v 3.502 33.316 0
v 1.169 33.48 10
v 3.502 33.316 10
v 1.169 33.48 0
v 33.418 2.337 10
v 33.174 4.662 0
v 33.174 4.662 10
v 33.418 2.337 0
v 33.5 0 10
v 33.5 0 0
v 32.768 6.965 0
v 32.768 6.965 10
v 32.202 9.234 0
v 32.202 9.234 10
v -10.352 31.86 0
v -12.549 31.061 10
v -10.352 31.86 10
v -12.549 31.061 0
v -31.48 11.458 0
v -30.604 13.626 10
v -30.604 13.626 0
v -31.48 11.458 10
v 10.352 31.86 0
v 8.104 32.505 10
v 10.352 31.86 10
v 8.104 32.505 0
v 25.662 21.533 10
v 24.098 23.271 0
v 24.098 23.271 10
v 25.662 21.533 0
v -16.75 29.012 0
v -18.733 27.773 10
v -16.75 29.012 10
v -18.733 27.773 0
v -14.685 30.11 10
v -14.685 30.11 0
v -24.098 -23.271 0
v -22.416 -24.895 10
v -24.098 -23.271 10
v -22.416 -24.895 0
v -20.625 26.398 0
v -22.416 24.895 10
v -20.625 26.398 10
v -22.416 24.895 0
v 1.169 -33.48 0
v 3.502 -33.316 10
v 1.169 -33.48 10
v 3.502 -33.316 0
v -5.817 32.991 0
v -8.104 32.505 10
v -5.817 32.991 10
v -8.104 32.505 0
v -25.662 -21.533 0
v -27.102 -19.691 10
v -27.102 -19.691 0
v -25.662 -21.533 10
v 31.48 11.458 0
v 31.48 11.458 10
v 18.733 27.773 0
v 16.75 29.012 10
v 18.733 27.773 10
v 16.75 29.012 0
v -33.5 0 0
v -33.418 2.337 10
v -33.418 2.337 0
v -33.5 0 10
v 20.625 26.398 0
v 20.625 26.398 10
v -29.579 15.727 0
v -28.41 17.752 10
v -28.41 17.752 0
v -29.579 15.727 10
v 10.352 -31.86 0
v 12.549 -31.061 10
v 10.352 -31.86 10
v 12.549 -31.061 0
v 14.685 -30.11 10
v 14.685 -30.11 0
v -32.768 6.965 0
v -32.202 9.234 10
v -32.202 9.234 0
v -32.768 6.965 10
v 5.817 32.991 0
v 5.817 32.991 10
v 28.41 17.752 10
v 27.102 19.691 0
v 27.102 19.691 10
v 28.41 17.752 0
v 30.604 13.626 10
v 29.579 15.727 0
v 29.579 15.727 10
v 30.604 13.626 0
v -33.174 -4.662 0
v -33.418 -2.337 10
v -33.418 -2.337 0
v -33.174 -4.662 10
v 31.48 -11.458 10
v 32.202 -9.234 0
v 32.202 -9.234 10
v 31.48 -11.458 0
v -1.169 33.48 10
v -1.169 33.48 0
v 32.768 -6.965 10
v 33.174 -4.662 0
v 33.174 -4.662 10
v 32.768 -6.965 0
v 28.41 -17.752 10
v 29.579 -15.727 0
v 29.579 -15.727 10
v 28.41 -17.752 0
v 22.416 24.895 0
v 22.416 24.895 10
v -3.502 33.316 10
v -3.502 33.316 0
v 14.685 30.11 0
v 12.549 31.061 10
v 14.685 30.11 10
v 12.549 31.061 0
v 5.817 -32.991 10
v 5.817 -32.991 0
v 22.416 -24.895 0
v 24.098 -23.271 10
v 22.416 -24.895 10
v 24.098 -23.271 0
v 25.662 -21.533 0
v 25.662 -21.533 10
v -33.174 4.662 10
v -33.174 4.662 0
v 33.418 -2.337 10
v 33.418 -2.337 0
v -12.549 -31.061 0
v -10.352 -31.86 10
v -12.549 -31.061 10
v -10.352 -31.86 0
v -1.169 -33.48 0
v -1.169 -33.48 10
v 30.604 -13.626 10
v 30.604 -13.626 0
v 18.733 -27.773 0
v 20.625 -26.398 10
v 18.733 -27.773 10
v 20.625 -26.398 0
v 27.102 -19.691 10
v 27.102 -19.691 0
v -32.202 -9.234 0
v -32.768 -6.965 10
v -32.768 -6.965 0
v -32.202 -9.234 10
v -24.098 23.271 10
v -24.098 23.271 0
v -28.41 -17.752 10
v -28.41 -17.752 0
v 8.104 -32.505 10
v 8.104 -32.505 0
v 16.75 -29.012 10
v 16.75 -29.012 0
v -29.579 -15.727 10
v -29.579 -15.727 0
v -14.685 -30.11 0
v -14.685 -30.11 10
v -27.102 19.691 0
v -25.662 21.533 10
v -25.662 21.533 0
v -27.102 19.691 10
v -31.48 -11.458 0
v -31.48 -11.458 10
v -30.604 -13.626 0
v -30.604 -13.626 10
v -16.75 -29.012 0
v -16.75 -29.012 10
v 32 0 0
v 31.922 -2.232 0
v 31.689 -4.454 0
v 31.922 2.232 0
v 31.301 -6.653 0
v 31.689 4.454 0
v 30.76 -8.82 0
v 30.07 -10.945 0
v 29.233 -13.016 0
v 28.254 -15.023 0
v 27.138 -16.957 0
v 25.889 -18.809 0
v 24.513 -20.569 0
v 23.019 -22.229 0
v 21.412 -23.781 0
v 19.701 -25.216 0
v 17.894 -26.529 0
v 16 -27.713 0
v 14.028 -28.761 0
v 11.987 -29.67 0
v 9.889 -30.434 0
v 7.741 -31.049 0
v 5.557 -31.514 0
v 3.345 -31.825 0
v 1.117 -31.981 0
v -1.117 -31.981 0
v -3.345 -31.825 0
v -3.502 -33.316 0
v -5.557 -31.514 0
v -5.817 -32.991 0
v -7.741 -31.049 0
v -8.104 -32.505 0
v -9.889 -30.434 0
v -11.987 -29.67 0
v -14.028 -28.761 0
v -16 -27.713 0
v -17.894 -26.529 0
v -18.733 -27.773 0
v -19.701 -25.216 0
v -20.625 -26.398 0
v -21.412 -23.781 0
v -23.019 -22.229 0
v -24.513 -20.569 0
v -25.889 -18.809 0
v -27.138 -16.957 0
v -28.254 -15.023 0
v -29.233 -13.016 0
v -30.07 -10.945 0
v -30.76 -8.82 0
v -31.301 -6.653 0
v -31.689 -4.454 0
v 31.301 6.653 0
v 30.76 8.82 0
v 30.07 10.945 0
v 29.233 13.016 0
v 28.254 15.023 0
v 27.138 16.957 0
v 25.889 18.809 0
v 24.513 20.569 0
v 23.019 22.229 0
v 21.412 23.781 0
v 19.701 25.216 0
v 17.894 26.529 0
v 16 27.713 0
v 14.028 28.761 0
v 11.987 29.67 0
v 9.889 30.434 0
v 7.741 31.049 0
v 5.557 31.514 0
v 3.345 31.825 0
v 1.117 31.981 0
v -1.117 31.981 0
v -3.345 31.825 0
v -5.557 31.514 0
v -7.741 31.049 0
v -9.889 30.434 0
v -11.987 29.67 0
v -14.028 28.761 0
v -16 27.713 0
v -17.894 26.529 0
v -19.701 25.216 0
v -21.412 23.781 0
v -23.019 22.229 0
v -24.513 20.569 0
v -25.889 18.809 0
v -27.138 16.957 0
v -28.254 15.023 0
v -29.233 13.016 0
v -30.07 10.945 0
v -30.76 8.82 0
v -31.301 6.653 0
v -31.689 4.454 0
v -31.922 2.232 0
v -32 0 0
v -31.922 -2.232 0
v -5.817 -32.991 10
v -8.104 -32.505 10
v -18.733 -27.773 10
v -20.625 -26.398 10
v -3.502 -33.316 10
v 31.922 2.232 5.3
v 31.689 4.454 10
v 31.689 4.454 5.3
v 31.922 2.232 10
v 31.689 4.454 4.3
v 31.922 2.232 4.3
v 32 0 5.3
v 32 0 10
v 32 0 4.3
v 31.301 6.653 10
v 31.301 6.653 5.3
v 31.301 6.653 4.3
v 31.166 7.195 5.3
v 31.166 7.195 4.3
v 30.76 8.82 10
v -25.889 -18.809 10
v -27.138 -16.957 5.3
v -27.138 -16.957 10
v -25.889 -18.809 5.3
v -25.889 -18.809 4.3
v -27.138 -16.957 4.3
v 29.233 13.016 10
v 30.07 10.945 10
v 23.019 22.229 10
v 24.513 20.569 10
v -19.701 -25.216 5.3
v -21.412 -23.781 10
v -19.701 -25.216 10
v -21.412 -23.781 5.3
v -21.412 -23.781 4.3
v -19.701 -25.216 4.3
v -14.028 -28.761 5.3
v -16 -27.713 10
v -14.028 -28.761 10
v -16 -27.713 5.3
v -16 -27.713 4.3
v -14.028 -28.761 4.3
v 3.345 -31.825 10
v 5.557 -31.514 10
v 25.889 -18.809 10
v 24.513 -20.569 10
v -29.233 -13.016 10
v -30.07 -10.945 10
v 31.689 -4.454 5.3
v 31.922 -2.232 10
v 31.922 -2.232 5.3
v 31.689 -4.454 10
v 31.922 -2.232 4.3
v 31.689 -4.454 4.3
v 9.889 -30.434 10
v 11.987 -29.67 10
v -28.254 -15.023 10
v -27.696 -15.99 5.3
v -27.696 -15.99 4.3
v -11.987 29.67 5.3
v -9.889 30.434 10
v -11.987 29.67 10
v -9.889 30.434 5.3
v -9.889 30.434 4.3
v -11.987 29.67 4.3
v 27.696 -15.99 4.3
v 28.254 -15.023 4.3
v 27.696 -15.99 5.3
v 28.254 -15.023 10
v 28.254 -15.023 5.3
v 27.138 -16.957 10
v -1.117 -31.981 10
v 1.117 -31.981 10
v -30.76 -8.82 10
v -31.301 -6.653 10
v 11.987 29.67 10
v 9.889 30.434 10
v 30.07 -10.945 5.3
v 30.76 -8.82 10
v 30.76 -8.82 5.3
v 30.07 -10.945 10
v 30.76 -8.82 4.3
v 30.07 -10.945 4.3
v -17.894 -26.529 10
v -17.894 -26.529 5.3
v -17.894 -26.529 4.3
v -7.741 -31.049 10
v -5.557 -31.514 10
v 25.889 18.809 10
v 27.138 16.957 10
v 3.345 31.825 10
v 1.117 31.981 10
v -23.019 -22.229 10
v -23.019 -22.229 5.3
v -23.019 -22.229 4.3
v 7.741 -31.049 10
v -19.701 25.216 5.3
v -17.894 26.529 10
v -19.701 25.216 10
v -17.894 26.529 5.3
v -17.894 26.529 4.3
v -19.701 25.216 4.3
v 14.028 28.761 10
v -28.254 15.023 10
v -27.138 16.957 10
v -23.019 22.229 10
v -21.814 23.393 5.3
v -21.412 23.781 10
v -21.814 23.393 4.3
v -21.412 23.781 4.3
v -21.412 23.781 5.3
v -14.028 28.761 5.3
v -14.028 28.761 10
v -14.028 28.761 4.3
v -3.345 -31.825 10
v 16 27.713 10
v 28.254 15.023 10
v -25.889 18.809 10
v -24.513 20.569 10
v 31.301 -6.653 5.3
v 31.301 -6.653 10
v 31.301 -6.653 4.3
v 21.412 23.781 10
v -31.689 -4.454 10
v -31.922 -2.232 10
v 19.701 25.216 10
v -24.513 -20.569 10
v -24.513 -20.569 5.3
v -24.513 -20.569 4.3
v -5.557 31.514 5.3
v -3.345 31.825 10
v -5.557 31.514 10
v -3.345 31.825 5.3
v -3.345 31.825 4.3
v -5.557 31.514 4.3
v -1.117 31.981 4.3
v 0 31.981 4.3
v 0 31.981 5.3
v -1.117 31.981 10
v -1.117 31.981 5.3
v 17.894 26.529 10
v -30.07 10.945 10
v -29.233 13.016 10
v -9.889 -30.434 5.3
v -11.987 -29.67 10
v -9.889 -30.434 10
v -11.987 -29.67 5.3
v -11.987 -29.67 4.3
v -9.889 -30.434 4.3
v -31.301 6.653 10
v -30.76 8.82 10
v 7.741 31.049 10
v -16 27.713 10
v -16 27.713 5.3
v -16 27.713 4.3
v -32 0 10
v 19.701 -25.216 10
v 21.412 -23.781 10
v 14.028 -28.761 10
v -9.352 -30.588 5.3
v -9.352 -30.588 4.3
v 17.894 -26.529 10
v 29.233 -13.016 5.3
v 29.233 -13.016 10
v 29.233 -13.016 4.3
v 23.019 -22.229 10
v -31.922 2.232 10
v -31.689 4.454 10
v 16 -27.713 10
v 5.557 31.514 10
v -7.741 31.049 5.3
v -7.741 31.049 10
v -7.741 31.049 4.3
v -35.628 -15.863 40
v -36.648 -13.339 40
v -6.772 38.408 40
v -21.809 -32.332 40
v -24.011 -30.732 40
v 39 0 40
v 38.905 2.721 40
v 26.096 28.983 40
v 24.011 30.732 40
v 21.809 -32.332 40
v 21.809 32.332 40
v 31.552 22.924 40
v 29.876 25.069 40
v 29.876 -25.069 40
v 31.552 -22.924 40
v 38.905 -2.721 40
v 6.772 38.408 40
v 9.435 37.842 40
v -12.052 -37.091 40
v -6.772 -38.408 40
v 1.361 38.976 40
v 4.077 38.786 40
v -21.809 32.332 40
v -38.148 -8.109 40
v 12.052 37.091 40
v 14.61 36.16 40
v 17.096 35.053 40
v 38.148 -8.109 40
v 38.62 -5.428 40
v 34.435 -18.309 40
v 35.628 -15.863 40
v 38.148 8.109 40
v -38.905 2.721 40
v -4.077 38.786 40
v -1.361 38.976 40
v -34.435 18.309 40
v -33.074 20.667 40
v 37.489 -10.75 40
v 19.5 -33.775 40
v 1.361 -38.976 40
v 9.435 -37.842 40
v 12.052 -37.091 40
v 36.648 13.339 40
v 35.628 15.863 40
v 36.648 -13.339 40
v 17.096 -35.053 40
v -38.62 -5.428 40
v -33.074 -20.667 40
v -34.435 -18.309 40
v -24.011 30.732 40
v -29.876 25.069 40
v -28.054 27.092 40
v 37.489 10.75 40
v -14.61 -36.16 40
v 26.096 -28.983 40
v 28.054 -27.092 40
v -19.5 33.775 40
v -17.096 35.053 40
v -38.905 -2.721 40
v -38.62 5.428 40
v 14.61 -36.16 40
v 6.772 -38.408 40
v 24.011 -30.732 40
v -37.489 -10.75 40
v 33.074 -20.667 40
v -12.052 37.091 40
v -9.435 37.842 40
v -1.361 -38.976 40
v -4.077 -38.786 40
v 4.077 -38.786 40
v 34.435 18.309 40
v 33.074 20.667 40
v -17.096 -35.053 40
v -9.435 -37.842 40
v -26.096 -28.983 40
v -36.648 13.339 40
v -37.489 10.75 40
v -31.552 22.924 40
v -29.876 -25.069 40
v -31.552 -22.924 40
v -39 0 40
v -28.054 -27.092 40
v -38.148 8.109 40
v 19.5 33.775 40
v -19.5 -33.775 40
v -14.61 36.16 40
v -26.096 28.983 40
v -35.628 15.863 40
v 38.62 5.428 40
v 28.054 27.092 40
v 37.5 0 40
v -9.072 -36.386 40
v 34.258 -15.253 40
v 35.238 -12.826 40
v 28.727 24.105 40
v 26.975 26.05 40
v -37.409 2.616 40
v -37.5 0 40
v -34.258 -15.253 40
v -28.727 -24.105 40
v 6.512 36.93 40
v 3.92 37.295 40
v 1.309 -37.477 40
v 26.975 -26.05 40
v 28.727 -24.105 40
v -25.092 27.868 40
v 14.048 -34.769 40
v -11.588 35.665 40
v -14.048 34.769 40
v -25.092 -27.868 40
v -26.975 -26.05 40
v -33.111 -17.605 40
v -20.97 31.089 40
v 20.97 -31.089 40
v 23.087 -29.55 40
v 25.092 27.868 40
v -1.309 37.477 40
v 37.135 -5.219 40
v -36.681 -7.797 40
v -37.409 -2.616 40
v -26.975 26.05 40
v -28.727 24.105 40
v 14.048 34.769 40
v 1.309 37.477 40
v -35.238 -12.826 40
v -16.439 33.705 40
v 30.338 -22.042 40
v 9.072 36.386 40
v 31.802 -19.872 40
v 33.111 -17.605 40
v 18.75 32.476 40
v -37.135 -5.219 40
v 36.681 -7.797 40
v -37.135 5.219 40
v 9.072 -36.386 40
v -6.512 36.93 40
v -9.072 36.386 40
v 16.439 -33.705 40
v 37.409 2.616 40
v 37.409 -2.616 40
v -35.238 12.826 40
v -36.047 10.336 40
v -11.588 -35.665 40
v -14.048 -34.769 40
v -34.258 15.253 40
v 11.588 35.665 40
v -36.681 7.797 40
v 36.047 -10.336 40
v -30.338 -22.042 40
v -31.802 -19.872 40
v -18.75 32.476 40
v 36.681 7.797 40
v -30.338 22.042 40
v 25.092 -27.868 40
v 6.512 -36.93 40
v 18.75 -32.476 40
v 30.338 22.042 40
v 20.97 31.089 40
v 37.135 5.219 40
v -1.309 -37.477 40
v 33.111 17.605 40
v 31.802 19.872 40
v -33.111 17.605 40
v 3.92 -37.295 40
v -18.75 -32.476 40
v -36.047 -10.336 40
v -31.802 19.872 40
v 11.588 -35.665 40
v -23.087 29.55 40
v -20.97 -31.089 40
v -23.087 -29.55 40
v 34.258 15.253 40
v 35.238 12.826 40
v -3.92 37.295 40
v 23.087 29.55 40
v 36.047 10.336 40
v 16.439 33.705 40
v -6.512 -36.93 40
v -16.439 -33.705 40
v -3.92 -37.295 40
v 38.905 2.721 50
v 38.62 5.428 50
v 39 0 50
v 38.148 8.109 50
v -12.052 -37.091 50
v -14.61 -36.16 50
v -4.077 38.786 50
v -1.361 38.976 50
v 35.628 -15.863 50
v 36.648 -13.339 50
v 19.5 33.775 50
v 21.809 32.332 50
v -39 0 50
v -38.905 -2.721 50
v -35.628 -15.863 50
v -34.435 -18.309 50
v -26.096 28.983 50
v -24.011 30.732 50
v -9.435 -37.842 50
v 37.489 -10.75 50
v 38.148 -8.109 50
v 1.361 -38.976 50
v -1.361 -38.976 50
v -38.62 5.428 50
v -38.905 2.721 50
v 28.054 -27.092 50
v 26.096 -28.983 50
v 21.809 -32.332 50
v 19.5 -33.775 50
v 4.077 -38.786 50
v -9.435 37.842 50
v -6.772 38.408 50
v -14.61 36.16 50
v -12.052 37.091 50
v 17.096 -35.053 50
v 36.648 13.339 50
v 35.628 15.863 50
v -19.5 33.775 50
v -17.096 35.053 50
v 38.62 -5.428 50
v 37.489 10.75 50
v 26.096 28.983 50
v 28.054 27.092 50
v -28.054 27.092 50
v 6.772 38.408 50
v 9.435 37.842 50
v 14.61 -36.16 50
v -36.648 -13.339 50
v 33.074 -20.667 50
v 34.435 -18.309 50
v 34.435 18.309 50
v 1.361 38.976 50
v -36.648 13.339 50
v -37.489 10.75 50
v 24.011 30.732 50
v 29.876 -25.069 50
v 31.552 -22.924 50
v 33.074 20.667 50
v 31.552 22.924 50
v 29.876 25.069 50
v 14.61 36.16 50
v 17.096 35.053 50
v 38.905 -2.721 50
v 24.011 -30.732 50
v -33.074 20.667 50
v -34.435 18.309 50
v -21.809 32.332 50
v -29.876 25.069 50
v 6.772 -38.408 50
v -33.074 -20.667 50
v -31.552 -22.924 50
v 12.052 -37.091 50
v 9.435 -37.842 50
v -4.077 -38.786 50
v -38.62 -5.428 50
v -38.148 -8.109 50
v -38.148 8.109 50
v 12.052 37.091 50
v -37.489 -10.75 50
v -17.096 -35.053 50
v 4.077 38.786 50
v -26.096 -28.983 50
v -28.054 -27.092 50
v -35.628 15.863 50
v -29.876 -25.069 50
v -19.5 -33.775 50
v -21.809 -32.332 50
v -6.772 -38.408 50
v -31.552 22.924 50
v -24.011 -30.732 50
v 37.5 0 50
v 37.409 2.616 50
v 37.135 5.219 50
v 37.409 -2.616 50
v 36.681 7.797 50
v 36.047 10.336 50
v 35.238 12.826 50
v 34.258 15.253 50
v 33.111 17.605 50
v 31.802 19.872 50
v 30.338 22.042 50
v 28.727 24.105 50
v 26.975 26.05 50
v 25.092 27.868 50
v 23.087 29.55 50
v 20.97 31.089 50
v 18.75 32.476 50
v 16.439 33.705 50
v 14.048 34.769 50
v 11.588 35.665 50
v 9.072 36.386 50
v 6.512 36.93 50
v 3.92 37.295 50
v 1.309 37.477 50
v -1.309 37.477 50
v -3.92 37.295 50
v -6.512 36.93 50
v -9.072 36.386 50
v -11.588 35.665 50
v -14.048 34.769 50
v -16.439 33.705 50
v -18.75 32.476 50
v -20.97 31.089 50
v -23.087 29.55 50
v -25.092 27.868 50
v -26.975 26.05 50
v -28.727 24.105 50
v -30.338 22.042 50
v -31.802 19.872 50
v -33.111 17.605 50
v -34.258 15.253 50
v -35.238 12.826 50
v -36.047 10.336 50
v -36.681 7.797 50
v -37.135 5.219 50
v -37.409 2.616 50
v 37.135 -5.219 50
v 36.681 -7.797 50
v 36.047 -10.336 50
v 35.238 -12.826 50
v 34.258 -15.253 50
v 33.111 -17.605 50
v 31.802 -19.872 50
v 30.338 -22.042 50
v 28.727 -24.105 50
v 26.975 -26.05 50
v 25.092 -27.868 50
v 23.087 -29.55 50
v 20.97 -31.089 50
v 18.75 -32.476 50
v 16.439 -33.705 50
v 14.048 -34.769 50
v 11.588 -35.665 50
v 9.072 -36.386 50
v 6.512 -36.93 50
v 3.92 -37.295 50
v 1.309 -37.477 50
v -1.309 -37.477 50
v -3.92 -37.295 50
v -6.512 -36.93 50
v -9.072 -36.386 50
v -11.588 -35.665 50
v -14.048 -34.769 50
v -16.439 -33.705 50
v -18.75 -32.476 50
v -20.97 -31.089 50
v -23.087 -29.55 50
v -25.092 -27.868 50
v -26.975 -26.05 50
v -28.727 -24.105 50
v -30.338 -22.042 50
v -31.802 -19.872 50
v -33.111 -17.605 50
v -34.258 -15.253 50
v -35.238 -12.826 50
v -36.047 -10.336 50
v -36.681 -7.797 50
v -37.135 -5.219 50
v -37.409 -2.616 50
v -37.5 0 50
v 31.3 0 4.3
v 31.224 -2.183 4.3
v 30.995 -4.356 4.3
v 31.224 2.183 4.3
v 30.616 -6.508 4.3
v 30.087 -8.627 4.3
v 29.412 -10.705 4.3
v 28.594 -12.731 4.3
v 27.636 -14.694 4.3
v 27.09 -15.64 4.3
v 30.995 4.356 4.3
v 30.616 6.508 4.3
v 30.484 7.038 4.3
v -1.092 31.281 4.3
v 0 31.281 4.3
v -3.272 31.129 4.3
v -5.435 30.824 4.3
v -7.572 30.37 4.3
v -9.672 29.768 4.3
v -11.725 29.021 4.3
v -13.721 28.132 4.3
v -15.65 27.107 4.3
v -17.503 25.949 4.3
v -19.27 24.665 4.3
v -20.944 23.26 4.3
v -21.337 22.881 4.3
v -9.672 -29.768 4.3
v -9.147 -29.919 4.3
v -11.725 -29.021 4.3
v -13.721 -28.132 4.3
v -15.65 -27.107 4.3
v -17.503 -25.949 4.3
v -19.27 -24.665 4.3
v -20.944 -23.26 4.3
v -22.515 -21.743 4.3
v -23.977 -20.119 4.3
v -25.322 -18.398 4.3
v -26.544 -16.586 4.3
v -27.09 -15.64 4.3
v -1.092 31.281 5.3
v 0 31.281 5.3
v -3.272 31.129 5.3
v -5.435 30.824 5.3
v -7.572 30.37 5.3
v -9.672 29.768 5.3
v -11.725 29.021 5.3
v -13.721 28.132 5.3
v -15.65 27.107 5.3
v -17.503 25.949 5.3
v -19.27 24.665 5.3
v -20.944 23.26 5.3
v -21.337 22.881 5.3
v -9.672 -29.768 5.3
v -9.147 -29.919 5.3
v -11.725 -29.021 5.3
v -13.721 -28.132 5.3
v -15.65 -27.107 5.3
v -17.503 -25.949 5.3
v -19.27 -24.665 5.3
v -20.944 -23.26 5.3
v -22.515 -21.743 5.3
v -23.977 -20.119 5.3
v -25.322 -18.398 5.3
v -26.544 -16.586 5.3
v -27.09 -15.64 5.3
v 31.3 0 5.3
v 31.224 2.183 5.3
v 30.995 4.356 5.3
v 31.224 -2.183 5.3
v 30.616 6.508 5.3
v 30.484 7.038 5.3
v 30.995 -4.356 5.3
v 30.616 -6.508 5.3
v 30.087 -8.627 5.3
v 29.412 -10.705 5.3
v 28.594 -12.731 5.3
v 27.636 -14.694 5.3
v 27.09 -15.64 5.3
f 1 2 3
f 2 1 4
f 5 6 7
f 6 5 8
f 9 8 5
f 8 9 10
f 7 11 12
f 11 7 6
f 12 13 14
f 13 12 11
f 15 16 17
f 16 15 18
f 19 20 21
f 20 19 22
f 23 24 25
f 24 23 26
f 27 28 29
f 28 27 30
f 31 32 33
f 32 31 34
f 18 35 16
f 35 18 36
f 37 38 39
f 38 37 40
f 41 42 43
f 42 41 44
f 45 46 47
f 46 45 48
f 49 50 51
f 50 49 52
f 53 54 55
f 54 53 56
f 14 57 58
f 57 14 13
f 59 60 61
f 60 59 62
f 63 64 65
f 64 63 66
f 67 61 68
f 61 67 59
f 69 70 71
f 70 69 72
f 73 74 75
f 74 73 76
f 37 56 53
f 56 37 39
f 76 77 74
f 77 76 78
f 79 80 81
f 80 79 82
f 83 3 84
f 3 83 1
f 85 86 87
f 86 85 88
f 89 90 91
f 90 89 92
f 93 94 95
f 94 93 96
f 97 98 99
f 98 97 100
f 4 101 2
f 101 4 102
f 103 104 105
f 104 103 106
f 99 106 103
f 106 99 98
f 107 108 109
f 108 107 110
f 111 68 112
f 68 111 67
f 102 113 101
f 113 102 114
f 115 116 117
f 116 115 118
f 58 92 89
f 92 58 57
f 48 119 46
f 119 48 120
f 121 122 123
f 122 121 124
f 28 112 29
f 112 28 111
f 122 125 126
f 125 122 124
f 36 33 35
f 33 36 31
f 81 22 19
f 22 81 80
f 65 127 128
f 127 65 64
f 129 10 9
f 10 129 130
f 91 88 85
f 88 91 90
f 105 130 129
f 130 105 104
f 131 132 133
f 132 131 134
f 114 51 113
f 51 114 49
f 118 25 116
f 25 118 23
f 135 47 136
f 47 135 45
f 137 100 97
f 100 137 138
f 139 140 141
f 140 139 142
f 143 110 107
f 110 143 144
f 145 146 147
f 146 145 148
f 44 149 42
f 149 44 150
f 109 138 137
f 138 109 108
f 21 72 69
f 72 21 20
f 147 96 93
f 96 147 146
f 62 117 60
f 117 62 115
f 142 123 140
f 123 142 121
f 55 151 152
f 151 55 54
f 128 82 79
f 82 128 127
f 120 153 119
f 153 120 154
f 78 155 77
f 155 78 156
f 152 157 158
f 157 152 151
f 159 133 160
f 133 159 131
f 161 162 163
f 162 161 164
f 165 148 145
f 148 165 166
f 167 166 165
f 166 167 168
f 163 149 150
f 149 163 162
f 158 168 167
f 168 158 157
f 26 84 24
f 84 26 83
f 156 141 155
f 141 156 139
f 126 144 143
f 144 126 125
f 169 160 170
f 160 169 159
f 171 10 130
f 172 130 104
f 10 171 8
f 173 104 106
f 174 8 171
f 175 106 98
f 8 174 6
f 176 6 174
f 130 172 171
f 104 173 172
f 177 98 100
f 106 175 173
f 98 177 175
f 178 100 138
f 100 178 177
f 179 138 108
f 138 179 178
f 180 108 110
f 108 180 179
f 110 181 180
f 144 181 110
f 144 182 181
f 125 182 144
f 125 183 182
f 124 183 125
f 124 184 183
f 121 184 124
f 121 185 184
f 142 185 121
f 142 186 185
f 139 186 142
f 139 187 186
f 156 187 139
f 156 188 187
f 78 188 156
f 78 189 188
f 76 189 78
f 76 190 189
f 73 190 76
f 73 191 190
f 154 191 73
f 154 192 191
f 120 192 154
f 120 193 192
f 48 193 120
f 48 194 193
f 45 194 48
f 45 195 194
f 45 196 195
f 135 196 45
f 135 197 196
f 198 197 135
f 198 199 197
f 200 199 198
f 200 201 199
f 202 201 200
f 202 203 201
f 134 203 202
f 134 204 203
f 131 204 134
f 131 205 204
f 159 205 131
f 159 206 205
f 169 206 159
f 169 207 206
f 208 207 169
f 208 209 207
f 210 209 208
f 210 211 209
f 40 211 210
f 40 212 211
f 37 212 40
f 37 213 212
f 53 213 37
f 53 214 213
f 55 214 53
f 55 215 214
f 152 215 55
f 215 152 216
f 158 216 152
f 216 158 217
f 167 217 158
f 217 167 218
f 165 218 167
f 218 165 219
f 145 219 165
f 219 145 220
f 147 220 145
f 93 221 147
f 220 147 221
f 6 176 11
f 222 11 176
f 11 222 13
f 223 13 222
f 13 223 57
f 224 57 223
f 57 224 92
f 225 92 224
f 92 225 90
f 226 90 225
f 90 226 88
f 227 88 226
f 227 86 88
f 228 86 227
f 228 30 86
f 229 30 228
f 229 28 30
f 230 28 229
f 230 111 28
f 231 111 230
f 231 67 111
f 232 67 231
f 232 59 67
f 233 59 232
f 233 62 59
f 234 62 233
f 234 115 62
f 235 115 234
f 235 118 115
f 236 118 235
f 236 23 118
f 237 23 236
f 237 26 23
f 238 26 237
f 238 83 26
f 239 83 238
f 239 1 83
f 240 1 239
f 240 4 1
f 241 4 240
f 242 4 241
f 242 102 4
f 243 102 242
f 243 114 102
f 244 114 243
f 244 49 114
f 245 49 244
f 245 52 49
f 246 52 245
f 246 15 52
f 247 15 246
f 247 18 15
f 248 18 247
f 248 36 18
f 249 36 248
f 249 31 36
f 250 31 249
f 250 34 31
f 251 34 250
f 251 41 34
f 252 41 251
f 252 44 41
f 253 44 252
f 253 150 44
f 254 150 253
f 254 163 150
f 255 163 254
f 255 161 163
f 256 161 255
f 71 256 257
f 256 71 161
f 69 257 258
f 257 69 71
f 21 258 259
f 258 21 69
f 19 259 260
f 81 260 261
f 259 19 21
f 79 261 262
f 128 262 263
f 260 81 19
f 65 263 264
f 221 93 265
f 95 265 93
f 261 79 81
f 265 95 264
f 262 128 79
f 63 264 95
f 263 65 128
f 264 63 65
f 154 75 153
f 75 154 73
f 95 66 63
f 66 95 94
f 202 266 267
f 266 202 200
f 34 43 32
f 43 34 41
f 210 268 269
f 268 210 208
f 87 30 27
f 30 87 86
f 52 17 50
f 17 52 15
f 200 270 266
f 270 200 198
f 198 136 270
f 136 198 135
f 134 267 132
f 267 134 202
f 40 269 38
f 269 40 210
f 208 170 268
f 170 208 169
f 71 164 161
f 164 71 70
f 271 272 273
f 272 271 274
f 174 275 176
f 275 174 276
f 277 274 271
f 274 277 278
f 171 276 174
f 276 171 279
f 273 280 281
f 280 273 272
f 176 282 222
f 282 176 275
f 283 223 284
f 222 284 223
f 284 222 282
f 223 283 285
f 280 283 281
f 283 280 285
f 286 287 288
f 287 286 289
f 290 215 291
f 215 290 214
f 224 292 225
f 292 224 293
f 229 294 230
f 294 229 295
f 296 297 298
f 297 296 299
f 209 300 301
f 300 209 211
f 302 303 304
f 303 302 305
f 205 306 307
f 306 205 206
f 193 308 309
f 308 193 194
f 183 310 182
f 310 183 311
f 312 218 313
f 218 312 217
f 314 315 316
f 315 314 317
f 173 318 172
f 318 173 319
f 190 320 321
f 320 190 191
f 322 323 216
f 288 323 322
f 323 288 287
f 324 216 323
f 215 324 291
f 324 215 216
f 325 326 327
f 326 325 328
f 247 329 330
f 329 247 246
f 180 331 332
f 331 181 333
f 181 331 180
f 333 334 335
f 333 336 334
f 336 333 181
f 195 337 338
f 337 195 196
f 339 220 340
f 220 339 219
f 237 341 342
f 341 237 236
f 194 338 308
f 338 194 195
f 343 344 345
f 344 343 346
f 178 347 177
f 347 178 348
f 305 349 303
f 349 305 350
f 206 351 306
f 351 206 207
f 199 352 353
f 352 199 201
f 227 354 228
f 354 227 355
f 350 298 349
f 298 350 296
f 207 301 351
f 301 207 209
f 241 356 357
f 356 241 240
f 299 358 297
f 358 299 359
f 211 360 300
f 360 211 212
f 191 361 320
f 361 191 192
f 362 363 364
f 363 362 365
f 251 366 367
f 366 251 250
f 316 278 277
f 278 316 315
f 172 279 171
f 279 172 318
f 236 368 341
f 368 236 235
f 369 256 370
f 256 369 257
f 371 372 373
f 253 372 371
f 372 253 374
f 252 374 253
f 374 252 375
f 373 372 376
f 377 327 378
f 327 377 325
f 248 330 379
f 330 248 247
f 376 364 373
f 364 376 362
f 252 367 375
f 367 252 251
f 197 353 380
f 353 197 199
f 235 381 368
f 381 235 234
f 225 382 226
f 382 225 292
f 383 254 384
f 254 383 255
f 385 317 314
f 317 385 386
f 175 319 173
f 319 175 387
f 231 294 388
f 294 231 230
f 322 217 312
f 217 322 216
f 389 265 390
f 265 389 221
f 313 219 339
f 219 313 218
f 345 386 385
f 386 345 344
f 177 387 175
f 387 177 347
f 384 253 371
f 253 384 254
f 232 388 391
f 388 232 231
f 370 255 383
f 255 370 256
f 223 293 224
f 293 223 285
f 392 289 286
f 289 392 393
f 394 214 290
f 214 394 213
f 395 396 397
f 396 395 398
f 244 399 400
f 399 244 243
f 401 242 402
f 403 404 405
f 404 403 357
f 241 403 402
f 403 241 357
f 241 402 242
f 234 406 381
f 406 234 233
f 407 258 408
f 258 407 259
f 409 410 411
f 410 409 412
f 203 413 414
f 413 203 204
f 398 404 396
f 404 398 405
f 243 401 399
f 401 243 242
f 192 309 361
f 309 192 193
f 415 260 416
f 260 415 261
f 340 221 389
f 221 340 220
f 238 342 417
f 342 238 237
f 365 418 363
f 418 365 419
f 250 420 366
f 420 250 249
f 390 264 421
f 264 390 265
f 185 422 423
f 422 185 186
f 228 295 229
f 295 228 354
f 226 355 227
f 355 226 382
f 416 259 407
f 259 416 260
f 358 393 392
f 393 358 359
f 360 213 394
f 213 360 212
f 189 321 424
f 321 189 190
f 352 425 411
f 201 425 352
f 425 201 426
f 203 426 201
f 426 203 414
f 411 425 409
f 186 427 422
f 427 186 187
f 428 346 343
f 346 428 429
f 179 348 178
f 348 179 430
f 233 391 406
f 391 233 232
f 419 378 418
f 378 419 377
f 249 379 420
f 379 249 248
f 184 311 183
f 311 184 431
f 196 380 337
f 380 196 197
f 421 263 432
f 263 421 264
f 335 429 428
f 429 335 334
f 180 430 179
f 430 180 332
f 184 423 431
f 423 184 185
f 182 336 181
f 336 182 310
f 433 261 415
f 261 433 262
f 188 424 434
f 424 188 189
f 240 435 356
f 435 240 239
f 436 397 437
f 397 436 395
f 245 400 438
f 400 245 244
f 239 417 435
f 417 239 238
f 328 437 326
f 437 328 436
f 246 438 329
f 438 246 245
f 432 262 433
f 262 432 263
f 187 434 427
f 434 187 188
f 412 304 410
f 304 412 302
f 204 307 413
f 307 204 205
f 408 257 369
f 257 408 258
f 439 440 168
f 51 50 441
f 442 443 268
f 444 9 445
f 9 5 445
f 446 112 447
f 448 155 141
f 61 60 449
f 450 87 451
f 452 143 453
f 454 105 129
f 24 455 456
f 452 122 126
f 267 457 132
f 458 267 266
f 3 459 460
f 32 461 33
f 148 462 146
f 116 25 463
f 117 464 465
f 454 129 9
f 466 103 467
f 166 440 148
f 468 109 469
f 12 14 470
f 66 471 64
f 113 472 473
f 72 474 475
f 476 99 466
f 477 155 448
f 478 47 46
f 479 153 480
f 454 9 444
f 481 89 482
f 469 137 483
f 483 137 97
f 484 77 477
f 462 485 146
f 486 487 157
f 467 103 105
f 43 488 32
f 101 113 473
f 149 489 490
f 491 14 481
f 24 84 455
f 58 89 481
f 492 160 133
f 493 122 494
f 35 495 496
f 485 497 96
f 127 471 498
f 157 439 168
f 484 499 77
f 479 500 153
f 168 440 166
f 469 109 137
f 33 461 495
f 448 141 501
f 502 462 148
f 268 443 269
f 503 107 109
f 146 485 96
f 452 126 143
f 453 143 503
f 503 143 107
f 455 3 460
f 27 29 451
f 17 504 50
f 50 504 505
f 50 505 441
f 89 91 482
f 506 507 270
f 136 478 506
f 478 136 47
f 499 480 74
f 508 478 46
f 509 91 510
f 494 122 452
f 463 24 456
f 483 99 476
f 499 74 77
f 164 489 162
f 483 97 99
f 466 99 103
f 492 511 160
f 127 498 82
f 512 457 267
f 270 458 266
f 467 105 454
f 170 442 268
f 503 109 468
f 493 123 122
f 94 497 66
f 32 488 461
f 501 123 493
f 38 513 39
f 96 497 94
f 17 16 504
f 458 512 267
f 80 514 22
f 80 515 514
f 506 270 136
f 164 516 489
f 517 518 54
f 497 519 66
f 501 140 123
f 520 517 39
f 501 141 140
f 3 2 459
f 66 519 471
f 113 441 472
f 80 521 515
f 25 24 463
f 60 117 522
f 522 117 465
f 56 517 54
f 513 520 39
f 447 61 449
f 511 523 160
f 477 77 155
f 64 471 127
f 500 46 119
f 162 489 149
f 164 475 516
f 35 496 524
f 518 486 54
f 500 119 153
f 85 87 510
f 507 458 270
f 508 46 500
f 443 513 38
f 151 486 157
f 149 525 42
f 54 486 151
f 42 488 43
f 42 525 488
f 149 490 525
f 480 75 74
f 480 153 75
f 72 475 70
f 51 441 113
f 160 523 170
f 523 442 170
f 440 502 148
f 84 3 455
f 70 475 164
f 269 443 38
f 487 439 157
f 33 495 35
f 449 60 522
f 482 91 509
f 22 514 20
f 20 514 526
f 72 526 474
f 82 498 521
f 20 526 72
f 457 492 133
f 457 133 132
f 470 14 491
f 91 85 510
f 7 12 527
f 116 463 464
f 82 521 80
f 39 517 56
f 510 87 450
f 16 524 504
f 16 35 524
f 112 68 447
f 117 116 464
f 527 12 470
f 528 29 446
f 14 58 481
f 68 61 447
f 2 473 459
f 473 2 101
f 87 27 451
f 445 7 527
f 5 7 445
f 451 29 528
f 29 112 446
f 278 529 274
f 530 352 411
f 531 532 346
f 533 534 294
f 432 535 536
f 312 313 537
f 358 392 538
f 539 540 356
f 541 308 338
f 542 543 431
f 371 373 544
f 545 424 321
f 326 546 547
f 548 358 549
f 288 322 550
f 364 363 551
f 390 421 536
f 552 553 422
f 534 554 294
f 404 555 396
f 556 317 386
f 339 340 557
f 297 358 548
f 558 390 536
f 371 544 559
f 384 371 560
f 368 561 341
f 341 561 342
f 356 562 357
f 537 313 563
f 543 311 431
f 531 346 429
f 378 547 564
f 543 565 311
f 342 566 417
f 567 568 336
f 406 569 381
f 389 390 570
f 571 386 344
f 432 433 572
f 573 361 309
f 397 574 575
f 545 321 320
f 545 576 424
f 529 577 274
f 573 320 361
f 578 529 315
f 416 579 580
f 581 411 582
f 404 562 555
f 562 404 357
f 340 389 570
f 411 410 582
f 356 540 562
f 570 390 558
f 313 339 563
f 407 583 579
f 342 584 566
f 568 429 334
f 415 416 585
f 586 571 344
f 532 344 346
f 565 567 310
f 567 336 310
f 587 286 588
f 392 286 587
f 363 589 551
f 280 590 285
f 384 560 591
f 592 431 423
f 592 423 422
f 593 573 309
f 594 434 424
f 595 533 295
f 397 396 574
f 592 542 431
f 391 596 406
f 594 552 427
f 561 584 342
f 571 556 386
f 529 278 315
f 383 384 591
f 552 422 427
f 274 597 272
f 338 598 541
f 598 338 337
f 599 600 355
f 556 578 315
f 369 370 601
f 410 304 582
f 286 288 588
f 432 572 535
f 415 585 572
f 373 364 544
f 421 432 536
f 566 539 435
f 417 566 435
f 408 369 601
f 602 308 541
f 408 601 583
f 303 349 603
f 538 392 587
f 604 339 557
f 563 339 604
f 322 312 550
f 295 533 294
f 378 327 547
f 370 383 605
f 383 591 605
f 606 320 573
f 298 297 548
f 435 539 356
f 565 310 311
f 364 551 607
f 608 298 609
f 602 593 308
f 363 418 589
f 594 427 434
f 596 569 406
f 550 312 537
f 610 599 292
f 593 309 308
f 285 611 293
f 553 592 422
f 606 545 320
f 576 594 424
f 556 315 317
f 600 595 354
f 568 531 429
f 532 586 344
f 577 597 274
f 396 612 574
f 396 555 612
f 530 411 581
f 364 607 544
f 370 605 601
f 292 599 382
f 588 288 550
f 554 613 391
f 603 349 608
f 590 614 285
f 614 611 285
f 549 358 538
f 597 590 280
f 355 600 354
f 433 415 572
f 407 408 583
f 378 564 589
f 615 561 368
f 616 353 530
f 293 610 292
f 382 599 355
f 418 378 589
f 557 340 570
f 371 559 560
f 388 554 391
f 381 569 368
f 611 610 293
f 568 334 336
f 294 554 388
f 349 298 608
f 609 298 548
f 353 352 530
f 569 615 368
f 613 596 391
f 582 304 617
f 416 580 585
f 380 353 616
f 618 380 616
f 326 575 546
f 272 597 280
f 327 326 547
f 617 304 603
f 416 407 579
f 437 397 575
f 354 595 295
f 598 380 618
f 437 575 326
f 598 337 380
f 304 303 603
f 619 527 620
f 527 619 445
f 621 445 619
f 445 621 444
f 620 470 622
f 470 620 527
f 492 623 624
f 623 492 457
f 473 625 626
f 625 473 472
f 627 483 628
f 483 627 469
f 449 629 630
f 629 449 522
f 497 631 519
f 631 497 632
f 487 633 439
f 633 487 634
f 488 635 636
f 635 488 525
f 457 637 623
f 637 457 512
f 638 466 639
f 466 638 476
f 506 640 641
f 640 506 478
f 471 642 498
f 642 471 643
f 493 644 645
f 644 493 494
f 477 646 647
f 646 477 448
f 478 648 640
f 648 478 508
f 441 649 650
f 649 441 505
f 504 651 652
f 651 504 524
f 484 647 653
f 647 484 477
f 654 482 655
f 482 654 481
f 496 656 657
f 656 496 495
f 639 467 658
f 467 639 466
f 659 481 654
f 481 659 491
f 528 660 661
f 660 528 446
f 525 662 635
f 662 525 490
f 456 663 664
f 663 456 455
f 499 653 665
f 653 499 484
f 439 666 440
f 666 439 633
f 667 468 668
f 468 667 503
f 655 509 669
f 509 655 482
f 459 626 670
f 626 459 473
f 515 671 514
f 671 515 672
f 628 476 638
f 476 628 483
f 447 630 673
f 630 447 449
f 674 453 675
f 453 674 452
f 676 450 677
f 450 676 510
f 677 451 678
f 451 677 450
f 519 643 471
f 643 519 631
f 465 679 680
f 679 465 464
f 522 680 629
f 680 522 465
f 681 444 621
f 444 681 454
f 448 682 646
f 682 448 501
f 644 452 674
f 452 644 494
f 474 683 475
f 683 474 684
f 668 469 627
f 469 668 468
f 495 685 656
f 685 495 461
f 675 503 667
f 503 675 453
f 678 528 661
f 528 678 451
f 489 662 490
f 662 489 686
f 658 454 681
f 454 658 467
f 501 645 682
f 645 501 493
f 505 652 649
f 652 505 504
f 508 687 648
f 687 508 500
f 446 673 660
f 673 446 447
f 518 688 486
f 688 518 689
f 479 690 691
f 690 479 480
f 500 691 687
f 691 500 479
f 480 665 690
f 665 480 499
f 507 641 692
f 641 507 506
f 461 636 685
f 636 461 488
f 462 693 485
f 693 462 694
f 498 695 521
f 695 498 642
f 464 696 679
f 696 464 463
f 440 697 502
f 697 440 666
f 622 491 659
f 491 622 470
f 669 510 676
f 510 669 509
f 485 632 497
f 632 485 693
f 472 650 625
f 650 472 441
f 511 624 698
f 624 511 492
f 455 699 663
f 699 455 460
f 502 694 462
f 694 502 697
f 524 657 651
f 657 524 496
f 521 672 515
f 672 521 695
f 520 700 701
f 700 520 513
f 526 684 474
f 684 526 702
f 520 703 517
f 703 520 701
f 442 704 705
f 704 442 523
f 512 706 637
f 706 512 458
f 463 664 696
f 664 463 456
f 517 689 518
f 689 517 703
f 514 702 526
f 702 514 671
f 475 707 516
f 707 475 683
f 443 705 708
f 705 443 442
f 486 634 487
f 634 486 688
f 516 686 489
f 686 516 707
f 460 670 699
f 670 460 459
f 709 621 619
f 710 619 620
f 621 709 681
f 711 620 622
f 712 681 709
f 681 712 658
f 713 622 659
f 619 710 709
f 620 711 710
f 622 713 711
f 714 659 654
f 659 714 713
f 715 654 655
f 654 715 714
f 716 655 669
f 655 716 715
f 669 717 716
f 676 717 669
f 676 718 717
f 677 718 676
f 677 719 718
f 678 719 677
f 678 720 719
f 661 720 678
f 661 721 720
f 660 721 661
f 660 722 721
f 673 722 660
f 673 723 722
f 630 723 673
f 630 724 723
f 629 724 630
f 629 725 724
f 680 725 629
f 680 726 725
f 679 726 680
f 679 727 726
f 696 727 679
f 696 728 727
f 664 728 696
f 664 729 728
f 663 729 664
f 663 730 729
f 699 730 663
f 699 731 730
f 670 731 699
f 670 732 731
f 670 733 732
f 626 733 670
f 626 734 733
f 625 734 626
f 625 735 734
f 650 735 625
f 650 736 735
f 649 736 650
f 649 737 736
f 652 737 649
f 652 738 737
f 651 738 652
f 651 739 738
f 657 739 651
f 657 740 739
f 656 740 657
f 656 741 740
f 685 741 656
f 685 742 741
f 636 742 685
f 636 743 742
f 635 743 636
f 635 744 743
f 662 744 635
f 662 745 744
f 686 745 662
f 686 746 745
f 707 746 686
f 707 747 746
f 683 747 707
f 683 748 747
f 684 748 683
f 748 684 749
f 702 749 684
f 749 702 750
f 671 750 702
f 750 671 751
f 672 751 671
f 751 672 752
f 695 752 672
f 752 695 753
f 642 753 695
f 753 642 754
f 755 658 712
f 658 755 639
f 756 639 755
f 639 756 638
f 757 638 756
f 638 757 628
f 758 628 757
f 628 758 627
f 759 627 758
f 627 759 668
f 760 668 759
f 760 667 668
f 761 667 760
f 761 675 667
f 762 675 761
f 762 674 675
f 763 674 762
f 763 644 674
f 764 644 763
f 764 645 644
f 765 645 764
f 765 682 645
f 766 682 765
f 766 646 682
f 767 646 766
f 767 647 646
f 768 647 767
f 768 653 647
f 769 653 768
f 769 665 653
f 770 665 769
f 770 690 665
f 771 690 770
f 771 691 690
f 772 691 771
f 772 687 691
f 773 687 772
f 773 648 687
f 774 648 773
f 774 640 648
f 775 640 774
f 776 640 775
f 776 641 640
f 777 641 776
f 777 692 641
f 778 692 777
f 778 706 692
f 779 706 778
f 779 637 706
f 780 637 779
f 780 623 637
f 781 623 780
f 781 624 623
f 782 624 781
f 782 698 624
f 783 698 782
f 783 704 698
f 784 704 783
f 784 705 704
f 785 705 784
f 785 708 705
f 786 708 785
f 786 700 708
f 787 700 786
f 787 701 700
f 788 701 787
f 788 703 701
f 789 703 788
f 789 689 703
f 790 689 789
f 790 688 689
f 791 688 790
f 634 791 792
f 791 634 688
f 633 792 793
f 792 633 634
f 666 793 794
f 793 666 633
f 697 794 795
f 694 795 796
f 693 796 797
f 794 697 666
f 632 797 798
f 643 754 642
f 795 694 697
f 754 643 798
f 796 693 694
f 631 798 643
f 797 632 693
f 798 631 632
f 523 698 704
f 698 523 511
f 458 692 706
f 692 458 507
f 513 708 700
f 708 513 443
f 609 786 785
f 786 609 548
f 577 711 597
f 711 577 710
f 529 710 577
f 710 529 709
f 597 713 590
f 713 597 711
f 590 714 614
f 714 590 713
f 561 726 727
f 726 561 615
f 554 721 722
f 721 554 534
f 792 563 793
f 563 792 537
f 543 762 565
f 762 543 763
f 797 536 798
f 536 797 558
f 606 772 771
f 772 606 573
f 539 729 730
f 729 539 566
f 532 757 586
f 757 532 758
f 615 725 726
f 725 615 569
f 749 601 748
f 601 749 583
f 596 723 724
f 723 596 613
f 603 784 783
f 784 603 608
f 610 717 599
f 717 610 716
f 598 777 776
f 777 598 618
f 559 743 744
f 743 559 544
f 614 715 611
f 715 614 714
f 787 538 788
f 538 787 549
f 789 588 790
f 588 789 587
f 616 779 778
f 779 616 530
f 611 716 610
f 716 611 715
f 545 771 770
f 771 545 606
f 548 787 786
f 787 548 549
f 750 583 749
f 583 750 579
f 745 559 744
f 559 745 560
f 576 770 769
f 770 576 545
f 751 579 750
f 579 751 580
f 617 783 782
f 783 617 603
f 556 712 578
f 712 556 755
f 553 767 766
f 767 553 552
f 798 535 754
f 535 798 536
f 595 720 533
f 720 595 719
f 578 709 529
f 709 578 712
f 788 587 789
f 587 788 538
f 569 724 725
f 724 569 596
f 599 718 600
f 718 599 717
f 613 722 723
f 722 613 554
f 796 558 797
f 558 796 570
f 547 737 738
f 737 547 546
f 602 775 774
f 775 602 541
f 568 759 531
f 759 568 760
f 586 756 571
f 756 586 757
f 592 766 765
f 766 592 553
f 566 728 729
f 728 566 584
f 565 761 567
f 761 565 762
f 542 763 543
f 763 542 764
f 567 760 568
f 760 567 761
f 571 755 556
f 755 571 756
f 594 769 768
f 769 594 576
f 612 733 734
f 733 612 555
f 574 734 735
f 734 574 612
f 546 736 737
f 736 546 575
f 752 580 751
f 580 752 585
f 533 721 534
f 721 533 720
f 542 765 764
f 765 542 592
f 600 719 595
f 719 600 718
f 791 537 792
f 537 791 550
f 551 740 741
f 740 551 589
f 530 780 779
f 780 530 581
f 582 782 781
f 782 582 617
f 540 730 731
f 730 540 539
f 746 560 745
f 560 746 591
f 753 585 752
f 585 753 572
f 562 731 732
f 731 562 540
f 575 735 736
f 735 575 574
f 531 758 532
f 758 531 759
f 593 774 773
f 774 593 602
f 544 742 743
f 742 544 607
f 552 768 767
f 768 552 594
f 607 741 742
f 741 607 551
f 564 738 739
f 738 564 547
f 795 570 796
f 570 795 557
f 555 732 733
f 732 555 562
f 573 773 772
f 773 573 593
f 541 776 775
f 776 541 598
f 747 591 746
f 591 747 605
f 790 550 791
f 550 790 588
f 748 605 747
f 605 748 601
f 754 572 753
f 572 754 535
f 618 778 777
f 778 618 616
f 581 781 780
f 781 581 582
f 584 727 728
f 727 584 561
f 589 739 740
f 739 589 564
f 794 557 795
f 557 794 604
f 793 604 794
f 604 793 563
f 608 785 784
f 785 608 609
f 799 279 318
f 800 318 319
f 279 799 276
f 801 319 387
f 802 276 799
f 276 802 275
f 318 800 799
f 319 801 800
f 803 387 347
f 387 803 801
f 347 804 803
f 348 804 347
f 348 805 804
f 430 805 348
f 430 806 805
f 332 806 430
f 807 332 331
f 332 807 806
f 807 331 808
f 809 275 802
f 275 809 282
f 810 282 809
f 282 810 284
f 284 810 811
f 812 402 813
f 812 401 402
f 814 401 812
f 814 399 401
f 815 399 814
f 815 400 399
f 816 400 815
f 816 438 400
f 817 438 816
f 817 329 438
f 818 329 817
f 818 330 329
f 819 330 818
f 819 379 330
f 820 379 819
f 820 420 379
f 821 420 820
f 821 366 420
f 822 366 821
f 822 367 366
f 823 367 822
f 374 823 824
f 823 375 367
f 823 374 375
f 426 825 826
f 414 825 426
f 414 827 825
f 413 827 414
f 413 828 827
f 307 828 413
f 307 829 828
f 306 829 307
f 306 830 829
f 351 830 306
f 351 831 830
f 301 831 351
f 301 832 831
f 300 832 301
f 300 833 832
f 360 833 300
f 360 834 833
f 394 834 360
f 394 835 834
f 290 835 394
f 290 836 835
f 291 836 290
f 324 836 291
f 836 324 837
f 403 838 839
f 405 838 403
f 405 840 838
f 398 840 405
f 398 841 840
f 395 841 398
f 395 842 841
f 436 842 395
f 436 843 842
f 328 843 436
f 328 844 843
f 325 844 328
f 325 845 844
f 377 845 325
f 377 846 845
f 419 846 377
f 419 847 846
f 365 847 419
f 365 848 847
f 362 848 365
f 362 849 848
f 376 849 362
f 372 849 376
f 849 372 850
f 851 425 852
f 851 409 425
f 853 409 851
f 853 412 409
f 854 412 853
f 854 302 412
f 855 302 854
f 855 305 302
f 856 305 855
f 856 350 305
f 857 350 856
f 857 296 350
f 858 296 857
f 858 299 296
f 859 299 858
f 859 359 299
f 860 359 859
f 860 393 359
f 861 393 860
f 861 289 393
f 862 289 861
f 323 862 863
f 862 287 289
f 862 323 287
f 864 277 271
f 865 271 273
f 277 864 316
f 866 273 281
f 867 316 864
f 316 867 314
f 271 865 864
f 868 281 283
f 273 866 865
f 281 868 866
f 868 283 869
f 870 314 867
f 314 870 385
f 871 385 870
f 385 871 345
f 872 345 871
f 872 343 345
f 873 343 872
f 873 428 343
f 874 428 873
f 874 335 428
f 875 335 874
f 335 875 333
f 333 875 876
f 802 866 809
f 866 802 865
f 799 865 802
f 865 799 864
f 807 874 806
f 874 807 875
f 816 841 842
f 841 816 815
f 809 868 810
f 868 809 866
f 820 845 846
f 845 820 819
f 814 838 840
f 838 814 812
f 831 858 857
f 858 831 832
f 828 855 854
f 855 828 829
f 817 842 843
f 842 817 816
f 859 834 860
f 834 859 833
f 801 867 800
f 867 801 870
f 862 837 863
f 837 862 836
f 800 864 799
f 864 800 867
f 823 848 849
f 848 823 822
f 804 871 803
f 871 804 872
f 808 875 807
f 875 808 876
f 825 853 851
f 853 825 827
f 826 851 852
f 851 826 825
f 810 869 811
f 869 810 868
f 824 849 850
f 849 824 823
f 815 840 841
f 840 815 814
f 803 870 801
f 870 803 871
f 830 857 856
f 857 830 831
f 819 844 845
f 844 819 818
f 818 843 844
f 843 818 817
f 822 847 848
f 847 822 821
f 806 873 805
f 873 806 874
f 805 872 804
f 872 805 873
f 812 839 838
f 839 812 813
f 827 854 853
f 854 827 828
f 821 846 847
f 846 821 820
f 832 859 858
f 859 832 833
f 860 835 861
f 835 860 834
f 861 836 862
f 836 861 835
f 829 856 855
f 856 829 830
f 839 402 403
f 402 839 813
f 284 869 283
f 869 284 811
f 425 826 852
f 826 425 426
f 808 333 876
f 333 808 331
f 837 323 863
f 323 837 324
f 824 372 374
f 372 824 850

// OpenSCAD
// [FL_INDEX: keywords="openscad, 3d_parametric, Parameterized_flanged_lens_hood, csg_solid" | COT="Parametric OpenSCAD design from 3DCodeverse"]
// Title: Parameterized flanged lens hood

//Parameterised olympus bayonet lens hood generator
// Glyn Cowles Feb 2014


//Thickness of tube walls 
thickness=1.5; 
//Inside diameter of bottom tube 
d1_inside=64;   
//Height of bottom tube 
h1=10;   
//Inside diameter of top tube
d2_inside=75;   
//Height of top tube
h2=10;   
//Height of connector section
c_ht=30; 
// Percentage of circumference for one flange
f_pcent=12;
// Flange thickness
f_th=.7;
//Flange height
f_ht=1;
// Resolution
$fn=90;

d1=d1_inside+2*thickness;
d2=d2_inside+2*thickness;
mask_degree=ceil(120-(f_pcent/100*360)); // this is the angle of the pie_slice mask
assemble(); 
//-----------------------------------------------------------------------
module tube(d,h,t) { // diameter height thickness
rad=d/2;
difference() {
cylinder(h=h,r=rad);
cylinder(h=h,r=rad-t);
}
}
//-----------------------------------------------------------------------

module connector(){
difference() {
 cylinder (h=c_ht,r1=d1/2,r2=d2/2);
 cylinder (h=c_ht,r1=d1/2-thickness,r2=d2/2-thickness);
}
}
//-----------------------------------------------------------------------

module flange() { // the three connecting lugs at the base
  difference() {
  tube(d1-thickness*2,f_ht,f_th);
  union () { 	
  		pie_slice(0,mask_degree,d1,f_ht)  ; //65 deg is the amount to remove
  		pie_slice(120,mask_degree,d1,f_ht)  ;
  		pie_slice(240,mask_degree,d1,f_ht)  ;
	}
  }
}
//-----------------------------------------------------------------------

module pie_slice(a,b,rad,h) { // make a pie slice starting at angle a continuing for angle b with radius of rad and height of h
	x1=sin(a)*rad;
	y1=cos(a)*rad;
	x2=sin(a+b)*rad;
	y2=cos(a+b)*rad;
	linear_extrude(height=h) 
	polygon(
		points=[ [0,0],[x1,y1],[x2,y2]]
	); 
}
//-----------------------------------------------------------------------

module assemble() {
union() {
	tube(d1,h1,thickness); //bottom tube
	translate([0,0,h1]) connector();  // connector
	translate([0,0,h1+c_ht])  tube(d2,h2,thickness); // top tube
	translate([0,0,h1/2-f_th]) flange(); //connecting lugs
	}
};
